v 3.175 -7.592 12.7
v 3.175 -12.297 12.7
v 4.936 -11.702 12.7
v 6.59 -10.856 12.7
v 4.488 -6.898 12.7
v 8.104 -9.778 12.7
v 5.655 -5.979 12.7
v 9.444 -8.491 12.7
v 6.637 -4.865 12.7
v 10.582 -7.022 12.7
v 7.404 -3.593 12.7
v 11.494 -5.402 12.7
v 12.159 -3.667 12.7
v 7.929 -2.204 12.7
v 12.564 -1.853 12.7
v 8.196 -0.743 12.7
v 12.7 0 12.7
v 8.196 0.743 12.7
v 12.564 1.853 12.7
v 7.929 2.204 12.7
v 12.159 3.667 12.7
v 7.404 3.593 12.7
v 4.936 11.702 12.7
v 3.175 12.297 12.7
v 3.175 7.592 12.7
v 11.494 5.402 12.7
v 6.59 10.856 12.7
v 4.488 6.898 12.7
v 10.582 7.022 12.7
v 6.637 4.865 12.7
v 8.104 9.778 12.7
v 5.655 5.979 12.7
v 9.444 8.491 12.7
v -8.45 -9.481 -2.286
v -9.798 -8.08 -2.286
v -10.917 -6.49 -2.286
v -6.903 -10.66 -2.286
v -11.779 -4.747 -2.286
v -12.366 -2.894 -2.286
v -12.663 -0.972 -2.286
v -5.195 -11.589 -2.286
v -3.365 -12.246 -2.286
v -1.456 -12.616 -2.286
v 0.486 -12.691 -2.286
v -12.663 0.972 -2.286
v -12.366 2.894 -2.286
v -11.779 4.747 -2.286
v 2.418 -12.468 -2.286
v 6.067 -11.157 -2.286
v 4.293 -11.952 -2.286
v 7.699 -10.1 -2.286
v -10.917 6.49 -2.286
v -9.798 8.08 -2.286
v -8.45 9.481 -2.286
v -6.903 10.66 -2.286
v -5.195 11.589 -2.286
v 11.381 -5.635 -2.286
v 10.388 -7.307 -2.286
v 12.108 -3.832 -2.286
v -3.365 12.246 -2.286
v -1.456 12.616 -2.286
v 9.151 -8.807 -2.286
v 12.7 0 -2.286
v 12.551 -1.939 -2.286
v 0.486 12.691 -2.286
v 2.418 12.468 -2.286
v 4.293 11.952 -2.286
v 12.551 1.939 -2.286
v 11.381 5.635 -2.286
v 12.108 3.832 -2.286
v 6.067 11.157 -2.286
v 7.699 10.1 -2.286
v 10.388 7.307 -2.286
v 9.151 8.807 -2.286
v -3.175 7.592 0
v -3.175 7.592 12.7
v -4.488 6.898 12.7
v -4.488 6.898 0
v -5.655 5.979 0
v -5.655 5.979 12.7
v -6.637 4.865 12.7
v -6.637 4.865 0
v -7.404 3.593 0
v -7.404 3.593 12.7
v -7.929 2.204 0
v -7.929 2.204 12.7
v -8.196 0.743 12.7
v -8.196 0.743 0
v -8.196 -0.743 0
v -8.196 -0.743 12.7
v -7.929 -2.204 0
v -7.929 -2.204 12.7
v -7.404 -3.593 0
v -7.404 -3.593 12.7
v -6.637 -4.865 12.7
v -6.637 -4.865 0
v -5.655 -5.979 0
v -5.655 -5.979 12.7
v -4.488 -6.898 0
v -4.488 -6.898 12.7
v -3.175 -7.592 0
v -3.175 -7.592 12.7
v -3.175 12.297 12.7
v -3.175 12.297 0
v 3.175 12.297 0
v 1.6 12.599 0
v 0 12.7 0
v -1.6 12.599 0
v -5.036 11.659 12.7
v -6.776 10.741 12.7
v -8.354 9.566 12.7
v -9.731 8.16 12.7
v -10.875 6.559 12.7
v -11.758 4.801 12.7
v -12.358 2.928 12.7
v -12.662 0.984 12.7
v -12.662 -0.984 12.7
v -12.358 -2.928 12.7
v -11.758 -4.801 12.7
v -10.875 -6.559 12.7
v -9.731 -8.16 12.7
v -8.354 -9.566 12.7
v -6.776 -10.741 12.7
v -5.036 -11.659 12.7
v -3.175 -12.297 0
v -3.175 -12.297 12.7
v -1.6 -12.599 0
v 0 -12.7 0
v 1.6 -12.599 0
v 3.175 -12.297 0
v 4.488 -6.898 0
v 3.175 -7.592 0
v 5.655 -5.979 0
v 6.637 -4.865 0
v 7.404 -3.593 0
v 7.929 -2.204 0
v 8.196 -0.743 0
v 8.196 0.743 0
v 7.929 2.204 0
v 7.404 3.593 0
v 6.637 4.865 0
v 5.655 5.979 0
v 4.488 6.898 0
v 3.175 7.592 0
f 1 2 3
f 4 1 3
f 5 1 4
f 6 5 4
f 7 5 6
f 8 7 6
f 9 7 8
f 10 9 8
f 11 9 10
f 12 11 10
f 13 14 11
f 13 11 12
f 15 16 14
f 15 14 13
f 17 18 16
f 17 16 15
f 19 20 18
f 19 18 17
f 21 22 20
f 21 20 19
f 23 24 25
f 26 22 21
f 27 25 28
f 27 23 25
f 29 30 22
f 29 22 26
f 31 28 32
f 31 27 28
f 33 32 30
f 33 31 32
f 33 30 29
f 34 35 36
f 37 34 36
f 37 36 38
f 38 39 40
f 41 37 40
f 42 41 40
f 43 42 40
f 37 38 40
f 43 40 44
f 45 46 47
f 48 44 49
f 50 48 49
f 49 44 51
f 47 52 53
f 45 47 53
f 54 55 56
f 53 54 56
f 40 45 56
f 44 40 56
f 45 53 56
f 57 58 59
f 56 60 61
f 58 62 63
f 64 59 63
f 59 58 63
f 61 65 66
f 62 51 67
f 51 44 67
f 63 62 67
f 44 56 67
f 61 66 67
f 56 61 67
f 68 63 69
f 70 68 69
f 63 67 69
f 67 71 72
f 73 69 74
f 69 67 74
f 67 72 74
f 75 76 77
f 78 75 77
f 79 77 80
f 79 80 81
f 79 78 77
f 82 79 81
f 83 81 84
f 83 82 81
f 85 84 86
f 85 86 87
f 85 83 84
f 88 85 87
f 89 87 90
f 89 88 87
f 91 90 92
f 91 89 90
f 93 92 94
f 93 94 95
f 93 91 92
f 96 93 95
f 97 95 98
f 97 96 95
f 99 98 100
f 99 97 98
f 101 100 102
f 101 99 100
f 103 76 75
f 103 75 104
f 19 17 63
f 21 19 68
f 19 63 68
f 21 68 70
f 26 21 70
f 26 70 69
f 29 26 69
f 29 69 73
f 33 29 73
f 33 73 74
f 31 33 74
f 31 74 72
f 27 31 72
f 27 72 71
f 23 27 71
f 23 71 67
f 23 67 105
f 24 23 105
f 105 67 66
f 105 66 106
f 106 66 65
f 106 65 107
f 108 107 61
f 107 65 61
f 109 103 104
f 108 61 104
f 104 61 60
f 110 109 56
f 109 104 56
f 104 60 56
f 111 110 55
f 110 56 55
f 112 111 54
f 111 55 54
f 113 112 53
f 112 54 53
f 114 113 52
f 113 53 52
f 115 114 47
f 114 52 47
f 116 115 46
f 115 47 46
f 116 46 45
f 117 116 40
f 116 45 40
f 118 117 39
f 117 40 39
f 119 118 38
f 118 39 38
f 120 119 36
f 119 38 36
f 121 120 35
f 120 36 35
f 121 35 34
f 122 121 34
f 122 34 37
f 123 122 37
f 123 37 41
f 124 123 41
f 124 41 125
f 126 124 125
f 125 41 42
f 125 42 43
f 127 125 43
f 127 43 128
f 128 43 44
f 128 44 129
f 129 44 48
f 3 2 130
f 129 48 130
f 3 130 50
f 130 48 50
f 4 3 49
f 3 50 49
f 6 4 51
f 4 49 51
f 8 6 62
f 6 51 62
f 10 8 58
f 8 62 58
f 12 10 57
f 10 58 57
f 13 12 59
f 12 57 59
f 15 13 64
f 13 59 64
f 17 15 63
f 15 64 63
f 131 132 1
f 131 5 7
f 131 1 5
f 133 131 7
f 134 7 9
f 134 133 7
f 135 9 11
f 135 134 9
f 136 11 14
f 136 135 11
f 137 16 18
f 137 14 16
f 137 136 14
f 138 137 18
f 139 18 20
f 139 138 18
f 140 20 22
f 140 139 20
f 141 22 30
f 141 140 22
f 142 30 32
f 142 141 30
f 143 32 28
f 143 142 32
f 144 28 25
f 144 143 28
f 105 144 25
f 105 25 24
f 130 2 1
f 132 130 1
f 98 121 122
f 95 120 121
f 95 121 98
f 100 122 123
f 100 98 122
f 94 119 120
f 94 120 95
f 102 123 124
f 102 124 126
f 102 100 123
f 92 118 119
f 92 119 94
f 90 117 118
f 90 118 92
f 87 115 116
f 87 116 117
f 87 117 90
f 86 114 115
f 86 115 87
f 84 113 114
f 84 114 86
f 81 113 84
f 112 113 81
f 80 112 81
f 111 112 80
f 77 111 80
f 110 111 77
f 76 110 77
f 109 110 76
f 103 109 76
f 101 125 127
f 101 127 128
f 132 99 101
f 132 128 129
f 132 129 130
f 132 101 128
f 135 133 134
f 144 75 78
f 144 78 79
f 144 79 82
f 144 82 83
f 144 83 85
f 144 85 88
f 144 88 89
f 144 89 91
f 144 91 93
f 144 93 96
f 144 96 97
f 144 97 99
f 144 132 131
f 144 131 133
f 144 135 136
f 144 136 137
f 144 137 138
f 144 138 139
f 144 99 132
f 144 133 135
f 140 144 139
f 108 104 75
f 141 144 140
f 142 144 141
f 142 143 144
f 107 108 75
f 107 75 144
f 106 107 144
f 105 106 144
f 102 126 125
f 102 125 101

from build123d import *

# Parameters (mm, degrees)
F0_R     = 12.7
F0_R_2   = 8.2296
F1_DEPTH = 2.286
F2_DEPTH = 12.7
F3_W     = 6.35
F3_H     = 35.38055
F4_DEPTH = 12.7


with BuildPart() as f1:
    # F0 (on Top) → F1 (new body)
    with BuildSketch(Plane.XY):
        Circle(F0_R)
        Circle(F0_R_2, mode=Mode.SUBTRACT)
        Circle(F0_R_2)
    extrude(amount=-F1_DEPTH)

    # F0 (on Top) → F2 (join)
    with BuildSketch(Plane.XY):
        Circle(F0_R)
        Circle(F0_R_2, mode=Mode.SUBTRACT)
    extrude(amount=F2_DEPTH)

    # F3 (on face) → F4 (cut, through all)
    with BuildSketch(Plane.XY.offset(12.7)):
        Rectangle(F3_W, F3_H)
    extrude(amount=-F4_DEPTH, mode=Mode.SUBTRACT)


solid = f1.part
